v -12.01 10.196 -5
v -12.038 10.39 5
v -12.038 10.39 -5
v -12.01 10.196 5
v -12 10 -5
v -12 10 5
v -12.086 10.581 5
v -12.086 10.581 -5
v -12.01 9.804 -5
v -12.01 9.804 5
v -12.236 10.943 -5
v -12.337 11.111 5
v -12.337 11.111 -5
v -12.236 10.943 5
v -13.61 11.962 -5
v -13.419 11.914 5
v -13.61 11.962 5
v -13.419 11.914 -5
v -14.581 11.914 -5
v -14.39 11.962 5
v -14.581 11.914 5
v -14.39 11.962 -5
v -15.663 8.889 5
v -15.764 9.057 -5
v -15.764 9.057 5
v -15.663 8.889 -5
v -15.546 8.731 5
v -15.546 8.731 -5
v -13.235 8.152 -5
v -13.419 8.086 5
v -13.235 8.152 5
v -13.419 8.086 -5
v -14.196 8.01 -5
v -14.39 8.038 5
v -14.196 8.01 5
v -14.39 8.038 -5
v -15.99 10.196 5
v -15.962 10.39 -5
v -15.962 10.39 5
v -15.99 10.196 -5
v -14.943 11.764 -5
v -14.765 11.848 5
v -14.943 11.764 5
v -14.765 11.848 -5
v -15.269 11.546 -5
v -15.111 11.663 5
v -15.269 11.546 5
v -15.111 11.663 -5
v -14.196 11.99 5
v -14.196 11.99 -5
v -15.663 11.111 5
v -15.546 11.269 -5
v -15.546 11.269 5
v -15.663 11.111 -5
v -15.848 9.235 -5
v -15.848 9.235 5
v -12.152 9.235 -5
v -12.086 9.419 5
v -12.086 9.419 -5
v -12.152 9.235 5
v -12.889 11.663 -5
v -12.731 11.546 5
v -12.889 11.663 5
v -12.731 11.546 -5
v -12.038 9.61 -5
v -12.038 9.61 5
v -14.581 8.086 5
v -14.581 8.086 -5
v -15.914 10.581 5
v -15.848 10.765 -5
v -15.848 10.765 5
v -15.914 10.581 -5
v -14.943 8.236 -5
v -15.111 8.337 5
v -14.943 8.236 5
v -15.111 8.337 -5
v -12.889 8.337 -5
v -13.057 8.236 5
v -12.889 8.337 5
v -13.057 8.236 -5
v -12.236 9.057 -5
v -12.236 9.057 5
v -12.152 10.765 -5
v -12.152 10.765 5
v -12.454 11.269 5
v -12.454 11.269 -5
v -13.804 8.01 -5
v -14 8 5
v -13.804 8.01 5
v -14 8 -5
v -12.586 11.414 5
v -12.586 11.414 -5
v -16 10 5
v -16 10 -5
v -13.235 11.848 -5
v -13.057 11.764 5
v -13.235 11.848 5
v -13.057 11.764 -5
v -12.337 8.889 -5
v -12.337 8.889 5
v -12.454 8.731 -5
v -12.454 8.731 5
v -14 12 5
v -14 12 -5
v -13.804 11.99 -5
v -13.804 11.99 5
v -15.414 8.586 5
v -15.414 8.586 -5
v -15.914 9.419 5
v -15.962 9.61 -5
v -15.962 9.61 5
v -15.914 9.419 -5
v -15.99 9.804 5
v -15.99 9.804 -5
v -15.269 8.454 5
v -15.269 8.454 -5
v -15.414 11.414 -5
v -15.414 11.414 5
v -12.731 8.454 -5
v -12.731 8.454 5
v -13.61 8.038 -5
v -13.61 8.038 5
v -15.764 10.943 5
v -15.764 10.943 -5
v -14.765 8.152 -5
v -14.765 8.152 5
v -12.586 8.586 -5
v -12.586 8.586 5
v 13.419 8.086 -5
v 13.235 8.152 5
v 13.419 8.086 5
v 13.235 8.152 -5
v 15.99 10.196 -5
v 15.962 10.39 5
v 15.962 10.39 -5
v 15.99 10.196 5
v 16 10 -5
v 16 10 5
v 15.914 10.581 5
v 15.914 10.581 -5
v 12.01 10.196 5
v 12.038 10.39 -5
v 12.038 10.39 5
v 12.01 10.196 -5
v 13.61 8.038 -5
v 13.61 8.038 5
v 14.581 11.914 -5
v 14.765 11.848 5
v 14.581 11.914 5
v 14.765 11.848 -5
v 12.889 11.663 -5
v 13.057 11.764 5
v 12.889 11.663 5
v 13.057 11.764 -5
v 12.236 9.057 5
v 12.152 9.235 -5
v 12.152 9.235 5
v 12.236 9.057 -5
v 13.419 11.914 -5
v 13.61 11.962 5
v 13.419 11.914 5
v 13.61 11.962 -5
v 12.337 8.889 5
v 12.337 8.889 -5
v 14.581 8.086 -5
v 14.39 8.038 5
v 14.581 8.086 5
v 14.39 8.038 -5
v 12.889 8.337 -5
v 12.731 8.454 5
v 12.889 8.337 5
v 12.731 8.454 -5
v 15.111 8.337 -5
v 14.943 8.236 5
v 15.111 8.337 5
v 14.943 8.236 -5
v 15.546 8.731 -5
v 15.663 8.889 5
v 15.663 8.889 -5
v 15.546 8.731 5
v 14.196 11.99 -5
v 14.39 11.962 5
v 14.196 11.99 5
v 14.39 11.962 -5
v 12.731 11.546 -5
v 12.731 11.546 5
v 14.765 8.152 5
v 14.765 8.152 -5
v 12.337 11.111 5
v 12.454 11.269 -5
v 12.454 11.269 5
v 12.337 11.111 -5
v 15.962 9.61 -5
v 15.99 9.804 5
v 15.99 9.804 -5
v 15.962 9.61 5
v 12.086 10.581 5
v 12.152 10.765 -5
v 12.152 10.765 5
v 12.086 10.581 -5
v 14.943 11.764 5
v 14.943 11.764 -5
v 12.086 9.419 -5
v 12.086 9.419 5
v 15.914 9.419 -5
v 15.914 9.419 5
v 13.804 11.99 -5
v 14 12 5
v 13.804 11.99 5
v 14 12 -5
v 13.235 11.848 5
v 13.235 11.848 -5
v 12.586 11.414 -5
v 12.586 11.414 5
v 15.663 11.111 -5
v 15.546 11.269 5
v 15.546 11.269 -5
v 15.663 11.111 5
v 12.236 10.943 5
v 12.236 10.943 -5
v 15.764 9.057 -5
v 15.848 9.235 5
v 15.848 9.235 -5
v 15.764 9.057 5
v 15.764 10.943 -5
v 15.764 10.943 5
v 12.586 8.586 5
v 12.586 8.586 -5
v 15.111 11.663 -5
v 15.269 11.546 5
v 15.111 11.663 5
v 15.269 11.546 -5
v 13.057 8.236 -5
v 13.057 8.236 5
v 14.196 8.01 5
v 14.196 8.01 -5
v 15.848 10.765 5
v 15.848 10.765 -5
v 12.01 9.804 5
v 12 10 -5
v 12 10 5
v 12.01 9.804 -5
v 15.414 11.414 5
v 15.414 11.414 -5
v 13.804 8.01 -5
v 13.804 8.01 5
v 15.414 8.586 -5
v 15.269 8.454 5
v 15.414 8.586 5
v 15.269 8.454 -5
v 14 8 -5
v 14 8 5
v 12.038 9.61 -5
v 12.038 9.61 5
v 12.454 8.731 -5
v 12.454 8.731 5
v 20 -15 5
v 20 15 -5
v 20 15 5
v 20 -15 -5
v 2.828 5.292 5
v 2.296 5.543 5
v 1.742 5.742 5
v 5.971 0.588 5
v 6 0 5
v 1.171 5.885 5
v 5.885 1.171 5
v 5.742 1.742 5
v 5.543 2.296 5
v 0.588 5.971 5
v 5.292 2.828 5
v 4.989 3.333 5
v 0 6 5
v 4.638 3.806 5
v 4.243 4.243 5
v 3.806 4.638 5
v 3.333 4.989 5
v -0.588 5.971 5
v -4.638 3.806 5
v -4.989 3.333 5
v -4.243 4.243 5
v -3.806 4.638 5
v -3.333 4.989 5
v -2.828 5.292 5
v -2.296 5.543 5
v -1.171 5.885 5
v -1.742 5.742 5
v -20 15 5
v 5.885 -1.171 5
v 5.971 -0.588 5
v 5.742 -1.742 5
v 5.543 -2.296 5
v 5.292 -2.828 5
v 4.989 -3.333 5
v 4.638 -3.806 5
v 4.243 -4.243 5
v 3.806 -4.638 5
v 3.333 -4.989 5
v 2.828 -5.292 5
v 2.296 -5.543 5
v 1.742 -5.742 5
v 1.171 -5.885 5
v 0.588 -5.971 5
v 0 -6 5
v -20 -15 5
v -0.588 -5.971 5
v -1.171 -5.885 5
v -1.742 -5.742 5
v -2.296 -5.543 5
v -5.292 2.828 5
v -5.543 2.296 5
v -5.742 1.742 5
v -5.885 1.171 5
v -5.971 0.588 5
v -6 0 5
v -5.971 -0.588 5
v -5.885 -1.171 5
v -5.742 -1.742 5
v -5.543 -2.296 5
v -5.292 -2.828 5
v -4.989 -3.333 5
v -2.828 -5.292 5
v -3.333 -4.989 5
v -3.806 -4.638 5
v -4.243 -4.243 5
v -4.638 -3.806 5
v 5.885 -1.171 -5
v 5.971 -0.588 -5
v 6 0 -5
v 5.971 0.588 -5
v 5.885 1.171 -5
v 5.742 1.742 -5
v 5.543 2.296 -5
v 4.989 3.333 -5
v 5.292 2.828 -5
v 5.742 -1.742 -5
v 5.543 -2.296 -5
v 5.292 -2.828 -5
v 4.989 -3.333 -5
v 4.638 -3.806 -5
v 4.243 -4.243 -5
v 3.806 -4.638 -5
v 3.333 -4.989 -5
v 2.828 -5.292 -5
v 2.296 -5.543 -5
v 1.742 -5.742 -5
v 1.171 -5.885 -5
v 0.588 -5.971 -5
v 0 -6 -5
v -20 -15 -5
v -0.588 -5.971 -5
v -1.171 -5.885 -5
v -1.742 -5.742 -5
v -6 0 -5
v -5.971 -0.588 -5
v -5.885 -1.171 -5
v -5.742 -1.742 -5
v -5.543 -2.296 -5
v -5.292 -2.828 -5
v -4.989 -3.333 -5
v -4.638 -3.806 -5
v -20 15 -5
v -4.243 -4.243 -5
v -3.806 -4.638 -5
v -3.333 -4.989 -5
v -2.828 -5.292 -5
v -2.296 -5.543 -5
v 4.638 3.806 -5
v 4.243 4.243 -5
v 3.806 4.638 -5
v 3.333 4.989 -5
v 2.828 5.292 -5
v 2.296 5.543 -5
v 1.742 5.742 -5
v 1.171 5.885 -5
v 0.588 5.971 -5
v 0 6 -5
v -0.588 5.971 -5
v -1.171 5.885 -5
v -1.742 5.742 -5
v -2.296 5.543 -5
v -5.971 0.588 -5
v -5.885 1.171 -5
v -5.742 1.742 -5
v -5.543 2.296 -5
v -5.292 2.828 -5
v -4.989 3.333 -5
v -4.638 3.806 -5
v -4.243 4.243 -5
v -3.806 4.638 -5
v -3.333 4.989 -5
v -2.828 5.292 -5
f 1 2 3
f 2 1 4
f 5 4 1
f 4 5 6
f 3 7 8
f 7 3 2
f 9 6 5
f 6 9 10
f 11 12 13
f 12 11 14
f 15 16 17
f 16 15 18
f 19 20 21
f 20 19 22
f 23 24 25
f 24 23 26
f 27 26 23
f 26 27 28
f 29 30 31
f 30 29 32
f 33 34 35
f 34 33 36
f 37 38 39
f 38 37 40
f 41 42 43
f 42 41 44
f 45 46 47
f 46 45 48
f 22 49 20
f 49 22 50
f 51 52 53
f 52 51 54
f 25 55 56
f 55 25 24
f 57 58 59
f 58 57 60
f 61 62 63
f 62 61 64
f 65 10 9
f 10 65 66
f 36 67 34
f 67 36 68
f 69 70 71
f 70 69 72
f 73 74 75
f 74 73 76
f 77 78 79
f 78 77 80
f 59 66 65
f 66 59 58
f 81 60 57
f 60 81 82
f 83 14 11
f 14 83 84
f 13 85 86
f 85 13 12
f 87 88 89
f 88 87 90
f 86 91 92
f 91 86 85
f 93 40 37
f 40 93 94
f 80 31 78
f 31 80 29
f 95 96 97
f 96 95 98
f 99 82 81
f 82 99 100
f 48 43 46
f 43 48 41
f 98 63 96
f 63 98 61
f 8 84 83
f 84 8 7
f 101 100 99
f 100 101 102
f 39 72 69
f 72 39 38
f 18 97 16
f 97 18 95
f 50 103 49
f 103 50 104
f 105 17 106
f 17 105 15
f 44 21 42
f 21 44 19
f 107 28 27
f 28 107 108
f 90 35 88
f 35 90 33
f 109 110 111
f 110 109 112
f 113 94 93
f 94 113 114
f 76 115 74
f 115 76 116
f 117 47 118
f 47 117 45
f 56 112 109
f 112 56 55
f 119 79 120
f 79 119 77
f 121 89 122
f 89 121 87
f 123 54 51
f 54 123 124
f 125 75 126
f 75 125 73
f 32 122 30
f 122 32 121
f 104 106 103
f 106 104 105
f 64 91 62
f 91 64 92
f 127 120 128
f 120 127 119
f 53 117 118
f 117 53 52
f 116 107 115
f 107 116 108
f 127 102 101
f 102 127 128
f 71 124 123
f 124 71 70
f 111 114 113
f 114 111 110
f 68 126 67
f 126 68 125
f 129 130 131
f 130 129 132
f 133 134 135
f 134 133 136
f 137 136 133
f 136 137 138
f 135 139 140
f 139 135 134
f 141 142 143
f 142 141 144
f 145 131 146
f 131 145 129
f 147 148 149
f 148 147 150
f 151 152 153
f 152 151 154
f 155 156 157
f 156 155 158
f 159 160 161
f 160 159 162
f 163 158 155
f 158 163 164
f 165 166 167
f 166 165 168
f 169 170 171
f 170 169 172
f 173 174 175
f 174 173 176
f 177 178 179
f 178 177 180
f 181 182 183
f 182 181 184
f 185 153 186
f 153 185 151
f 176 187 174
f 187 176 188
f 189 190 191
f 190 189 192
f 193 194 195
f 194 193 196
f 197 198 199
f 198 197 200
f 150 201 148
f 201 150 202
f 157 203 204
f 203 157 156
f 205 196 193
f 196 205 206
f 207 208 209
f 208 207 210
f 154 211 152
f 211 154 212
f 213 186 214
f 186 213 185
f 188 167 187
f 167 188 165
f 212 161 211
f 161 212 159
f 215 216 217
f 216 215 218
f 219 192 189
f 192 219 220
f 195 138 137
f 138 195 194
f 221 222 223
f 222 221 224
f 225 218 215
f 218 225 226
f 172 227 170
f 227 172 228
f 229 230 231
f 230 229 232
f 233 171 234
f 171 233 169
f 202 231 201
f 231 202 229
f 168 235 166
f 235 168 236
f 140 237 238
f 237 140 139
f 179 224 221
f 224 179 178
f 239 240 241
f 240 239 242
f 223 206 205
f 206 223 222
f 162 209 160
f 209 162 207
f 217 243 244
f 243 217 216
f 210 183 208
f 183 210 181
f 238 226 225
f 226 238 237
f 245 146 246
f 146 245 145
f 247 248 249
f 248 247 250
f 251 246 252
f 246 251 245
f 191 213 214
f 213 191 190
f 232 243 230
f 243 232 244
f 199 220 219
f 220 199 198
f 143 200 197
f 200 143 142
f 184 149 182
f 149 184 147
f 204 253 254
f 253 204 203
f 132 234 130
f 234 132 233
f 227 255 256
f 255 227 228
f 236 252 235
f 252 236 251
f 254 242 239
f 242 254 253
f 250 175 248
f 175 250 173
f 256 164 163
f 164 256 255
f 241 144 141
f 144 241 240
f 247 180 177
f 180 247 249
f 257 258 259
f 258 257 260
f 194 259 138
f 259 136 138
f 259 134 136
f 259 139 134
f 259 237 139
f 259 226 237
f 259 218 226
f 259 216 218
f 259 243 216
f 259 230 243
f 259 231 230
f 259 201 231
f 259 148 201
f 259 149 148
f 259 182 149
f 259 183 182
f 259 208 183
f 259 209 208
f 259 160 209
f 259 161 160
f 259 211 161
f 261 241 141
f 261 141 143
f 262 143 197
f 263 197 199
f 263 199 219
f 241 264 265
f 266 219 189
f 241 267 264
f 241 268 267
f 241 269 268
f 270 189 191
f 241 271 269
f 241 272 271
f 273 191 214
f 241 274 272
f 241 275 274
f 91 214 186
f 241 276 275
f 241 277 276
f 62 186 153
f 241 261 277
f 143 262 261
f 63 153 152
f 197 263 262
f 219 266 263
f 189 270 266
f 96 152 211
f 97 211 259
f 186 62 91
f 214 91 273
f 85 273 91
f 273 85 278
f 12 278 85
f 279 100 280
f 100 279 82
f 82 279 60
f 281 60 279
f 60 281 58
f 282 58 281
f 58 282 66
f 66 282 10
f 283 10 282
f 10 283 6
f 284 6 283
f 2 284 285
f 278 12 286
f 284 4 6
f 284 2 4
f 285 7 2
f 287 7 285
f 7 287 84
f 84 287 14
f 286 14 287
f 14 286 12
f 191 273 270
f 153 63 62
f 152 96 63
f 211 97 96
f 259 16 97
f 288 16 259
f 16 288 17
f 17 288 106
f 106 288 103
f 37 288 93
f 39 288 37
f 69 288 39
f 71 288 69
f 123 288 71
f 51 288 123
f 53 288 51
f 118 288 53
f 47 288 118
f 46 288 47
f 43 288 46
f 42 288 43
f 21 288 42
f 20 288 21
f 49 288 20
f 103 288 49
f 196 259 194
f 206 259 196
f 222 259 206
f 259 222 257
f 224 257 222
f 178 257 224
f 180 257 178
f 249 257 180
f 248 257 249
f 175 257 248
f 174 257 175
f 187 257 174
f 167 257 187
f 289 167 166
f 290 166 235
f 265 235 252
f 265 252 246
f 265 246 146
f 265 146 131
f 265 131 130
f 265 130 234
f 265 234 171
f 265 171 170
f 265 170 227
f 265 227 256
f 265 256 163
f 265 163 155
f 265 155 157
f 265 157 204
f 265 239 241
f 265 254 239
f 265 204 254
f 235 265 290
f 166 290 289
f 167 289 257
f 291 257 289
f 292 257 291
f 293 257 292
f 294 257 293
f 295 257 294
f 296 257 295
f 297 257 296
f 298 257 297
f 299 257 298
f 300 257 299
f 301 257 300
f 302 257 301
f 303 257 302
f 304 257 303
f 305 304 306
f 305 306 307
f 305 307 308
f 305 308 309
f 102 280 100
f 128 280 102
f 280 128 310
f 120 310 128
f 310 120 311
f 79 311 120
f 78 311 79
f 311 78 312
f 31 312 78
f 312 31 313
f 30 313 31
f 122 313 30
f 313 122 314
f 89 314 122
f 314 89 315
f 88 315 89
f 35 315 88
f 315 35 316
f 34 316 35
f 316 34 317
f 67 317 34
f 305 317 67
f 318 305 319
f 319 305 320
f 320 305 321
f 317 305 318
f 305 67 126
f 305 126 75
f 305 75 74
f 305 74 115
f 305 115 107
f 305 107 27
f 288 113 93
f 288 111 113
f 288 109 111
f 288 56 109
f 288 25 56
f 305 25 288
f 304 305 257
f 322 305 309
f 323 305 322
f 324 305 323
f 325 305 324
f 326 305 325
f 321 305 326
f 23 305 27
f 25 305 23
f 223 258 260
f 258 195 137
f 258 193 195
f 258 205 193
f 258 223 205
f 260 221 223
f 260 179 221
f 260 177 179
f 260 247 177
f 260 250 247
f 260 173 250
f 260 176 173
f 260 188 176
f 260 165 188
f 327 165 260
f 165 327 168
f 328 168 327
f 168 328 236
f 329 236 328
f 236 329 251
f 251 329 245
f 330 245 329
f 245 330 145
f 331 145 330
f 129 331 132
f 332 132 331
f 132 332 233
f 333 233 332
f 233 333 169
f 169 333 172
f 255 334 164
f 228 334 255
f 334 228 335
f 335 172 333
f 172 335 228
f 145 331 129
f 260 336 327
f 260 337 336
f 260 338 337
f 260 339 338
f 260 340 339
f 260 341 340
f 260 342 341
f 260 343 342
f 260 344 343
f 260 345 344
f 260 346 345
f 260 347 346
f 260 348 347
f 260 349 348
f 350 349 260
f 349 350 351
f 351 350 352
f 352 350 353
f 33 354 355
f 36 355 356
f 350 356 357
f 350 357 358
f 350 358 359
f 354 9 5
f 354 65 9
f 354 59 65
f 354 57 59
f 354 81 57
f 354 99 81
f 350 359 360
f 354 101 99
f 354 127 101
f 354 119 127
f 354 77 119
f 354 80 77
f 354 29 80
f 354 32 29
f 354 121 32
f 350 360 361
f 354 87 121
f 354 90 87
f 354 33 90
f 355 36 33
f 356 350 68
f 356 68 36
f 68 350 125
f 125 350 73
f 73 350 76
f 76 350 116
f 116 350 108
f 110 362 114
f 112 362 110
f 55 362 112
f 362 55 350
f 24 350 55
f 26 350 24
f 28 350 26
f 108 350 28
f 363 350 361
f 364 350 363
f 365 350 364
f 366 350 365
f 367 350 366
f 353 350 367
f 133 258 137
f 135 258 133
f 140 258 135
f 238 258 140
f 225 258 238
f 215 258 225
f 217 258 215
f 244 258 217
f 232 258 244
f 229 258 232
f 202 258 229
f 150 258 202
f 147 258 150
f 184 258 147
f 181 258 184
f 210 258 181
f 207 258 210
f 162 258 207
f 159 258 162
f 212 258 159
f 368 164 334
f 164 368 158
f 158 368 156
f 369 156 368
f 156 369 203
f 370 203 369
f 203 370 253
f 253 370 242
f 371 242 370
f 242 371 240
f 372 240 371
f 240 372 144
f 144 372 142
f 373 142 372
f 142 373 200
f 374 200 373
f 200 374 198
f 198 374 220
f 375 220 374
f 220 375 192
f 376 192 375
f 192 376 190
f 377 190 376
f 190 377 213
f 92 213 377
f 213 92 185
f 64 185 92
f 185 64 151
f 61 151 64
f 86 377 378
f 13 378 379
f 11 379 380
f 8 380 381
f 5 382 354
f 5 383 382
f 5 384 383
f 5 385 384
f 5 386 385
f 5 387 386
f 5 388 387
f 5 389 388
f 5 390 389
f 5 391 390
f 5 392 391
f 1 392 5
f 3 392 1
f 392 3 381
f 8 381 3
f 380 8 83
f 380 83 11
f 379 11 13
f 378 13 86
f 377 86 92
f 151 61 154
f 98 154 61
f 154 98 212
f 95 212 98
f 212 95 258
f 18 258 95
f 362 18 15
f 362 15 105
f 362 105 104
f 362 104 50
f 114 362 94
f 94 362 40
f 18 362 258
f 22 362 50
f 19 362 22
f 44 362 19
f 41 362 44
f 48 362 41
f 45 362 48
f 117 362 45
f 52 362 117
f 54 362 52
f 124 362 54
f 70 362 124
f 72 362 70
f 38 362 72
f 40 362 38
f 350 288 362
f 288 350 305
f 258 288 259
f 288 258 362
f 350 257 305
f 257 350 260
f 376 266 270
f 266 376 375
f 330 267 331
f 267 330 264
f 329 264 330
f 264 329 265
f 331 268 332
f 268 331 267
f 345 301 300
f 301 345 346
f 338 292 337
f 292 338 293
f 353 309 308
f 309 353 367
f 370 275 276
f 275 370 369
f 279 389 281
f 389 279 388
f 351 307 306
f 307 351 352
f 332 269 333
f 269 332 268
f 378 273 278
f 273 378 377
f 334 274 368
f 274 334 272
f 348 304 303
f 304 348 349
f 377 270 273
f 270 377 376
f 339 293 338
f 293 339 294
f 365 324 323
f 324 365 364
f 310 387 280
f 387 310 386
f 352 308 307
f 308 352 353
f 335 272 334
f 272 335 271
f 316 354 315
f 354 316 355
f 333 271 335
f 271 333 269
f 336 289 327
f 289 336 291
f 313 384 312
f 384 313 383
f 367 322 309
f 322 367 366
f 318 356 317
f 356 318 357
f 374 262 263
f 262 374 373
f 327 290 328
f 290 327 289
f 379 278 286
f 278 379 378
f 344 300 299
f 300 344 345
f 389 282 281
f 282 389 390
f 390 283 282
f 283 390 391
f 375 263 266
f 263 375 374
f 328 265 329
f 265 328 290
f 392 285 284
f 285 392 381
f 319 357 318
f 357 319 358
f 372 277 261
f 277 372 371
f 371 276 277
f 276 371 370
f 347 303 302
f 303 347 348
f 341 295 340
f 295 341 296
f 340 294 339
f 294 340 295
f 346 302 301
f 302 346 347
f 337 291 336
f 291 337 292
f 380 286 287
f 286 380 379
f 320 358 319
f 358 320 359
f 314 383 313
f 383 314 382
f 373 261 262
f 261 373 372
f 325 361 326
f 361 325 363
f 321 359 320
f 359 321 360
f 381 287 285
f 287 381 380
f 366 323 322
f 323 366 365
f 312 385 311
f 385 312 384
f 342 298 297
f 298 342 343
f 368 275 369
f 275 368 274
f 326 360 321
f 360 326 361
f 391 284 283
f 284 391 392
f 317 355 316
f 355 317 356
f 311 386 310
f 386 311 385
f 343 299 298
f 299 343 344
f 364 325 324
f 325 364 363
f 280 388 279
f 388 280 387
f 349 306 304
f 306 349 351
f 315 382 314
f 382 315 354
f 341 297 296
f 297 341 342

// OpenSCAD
// Generado con OpenSCAD GUI Mejorada
$fn = 64;

difference() { // Placa con agujeros
  cube([40, 30, 10], center = true); // Base
  translate([0, 0, 0]) { // Mover agujero
    cylinder(h = 12, r = 6, center = true); // Agujero central
  }
  // Agujeros laterales
  for (x = [-14, 14])
    translate([x, 10, 0]) cylinder(h = 12, r = 2, center = true);
}
